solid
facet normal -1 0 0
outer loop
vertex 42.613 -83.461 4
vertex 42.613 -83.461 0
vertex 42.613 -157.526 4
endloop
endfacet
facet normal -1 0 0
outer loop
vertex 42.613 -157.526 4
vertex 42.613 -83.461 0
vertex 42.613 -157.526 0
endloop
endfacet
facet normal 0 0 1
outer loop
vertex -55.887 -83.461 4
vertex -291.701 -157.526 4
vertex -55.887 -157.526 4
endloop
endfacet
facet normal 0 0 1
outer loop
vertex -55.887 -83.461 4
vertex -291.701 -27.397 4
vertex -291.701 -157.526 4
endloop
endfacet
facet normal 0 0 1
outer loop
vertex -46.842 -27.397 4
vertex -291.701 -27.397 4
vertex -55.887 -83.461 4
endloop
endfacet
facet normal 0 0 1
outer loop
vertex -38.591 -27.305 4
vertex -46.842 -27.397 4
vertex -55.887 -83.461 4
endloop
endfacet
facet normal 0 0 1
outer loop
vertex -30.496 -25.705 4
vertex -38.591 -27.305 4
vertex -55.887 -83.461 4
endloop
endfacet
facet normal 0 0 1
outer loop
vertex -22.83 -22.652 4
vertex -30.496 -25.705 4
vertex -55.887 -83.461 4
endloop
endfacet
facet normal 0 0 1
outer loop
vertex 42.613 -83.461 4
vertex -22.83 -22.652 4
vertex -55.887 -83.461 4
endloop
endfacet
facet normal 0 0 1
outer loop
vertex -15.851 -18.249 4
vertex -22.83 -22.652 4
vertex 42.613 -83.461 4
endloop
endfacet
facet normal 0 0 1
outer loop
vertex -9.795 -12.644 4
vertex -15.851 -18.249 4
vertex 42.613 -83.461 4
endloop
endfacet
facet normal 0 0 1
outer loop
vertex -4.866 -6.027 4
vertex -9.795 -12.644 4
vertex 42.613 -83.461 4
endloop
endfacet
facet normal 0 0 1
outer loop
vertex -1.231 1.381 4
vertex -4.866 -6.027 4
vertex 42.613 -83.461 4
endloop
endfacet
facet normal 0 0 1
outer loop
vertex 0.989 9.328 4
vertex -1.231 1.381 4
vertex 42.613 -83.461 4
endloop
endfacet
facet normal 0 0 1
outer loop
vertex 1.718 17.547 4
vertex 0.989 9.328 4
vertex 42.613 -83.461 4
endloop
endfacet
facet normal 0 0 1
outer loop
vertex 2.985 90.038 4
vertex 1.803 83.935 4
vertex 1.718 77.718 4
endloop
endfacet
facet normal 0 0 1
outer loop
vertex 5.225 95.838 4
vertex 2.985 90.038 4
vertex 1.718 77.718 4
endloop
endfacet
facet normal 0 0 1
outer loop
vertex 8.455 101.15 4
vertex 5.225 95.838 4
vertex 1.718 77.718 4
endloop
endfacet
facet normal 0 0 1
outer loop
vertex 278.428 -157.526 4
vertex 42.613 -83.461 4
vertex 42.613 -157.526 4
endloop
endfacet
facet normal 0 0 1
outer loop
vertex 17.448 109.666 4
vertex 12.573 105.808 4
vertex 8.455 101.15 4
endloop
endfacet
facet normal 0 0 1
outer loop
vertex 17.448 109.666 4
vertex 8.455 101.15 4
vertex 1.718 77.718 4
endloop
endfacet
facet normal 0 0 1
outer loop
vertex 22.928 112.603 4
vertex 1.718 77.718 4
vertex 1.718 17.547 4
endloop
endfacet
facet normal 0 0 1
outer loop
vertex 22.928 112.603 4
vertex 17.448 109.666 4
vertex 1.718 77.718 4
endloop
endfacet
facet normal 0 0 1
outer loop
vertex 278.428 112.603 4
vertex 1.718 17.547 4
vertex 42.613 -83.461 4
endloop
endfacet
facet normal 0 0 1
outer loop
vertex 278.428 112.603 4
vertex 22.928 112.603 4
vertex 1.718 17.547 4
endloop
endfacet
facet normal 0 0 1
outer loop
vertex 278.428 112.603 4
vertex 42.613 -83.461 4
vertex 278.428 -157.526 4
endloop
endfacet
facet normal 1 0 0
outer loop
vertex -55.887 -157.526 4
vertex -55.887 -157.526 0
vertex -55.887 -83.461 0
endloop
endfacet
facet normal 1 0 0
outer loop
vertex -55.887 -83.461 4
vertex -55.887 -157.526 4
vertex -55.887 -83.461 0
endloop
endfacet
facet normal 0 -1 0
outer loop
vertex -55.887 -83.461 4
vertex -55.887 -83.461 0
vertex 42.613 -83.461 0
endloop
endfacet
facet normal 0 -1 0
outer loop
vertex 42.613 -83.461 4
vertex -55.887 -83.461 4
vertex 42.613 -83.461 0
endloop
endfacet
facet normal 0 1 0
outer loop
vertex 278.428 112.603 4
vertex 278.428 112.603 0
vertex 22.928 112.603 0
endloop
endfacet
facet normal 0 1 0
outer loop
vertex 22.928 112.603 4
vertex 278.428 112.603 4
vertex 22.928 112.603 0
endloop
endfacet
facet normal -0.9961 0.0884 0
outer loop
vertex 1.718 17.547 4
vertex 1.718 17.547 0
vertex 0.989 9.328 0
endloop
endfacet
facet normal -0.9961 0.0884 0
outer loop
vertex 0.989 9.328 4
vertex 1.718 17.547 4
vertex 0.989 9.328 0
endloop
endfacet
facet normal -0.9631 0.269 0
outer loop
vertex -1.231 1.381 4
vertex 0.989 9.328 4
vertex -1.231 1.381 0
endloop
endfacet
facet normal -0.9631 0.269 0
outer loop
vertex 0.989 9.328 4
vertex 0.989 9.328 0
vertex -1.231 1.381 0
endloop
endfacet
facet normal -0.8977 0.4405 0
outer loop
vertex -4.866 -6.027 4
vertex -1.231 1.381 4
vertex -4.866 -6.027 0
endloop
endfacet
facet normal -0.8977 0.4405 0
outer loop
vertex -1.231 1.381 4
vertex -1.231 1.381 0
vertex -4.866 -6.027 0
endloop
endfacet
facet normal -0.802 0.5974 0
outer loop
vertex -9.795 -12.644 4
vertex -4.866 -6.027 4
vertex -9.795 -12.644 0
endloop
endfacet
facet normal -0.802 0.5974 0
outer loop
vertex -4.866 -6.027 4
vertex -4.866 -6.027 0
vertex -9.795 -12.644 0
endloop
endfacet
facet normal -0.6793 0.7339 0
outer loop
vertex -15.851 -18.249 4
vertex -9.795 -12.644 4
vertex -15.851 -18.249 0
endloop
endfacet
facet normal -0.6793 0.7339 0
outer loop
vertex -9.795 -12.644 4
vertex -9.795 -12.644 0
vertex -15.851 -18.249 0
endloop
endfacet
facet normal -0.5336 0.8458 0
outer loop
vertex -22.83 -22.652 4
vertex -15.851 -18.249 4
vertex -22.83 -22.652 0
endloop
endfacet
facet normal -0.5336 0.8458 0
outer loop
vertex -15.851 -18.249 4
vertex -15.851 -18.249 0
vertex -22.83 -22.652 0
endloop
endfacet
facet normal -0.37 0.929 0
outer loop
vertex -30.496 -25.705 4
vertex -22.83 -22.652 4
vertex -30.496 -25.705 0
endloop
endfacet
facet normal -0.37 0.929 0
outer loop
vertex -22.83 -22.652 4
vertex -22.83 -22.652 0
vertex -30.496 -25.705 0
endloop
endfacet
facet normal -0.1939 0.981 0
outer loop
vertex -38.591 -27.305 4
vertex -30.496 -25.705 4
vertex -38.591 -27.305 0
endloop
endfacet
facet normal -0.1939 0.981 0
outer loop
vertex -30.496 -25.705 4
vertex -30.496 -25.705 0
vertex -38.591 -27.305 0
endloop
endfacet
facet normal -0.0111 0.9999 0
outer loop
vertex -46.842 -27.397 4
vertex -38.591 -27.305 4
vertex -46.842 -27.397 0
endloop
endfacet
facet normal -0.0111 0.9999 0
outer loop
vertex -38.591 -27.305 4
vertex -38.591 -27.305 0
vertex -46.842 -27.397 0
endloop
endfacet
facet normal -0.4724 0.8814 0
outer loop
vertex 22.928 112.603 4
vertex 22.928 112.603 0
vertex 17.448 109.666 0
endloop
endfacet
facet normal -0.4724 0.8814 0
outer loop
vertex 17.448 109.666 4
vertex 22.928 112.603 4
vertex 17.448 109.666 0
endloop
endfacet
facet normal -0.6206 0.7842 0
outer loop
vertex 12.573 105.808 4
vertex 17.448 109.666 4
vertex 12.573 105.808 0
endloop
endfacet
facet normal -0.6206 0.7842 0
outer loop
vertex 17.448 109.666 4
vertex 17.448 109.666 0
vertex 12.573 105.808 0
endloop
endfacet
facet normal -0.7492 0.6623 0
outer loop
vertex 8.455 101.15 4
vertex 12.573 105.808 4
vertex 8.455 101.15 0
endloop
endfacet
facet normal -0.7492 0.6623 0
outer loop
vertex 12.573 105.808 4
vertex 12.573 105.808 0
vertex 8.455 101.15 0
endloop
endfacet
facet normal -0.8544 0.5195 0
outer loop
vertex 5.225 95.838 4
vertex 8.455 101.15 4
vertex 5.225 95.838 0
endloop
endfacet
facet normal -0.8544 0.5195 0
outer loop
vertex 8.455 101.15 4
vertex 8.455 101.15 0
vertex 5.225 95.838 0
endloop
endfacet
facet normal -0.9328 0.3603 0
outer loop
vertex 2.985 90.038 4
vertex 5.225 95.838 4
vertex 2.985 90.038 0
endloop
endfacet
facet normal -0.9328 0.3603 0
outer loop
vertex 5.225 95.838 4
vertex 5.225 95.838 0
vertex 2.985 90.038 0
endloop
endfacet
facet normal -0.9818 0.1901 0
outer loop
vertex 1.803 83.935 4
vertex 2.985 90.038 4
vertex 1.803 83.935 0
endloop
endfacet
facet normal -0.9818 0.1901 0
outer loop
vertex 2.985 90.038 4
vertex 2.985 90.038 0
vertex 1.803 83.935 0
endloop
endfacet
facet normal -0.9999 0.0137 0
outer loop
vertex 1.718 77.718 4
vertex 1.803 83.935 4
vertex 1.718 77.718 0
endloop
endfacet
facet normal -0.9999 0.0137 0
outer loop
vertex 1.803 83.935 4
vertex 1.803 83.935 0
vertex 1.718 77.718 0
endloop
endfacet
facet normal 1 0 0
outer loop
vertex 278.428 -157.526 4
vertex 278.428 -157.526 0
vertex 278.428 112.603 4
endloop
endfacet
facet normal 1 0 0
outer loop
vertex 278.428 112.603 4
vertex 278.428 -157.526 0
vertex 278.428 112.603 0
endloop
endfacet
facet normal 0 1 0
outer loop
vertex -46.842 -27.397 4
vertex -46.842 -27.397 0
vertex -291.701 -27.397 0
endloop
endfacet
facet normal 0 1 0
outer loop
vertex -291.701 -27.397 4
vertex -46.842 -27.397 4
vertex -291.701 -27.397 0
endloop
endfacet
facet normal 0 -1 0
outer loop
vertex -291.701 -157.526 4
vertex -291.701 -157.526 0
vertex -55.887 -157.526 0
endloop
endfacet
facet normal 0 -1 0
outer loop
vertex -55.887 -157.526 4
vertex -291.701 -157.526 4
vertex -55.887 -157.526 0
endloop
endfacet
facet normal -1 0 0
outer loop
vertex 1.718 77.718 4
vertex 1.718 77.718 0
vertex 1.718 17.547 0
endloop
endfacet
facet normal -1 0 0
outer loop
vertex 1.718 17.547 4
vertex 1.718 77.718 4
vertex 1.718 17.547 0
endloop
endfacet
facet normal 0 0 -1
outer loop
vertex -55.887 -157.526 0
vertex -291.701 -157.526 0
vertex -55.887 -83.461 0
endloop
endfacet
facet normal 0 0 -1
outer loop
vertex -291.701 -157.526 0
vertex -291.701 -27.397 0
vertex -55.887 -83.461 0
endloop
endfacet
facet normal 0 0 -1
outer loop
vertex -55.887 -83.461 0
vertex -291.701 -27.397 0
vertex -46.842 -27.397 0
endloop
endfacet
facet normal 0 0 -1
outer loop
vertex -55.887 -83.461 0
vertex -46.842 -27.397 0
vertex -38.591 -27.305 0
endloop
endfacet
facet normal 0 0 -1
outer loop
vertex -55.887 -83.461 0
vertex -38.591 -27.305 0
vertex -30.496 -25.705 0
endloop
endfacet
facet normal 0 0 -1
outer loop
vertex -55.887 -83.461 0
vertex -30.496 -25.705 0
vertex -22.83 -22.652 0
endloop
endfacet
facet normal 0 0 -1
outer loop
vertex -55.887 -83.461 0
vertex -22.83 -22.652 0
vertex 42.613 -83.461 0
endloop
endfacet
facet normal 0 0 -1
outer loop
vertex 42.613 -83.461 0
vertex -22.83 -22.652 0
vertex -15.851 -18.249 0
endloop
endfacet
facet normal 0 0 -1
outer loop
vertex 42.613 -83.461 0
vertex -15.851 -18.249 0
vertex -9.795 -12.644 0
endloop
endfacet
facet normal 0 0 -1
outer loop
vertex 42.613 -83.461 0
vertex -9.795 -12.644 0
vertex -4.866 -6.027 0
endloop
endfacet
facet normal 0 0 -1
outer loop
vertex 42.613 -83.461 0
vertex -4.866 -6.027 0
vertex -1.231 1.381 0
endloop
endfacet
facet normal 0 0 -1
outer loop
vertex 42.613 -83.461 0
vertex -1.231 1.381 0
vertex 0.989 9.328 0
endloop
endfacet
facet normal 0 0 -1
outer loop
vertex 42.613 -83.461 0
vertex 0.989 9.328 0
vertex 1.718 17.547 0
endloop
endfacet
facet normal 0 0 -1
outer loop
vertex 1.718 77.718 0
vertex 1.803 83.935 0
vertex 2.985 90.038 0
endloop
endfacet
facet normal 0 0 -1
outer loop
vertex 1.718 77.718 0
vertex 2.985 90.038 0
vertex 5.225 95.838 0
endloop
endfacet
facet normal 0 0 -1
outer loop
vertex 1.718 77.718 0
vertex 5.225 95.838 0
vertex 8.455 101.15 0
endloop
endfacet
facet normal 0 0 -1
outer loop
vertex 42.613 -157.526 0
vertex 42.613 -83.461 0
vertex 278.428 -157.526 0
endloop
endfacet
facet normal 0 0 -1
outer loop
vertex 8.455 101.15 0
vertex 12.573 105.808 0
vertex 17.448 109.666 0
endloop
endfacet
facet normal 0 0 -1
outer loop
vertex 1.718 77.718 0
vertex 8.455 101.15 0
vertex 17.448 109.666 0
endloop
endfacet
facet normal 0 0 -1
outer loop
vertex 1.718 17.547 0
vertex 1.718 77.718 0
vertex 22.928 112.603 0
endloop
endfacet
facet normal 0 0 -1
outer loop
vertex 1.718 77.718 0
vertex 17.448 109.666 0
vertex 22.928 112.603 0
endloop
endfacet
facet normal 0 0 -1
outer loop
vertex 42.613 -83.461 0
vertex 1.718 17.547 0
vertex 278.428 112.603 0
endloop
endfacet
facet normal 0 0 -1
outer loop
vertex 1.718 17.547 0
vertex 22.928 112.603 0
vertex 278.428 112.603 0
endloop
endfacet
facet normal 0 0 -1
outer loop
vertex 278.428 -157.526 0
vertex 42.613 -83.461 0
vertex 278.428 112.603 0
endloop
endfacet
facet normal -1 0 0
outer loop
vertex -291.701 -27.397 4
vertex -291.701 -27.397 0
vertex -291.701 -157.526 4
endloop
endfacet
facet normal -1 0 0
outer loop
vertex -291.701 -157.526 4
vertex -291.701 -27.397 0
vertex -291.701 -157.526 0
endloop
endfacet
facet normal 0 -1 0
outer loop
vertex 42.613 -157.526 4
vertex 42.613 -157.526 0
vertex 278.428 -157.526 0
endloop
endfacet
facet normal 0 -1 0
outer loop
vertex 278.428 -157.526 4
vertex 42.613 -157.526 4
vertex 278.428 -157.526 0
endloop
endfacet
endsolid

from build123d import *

# Parameters (mm, degrees)
F0_W     = 1
F0_H     = 6
F0_W_2   = 96.5
F1_DEPTH = 4


with BuildPart() as f1:
    # F0 (on Top) → F1 (new body)
    with BuildSketch(Plane.XY):
        with BuildLine():
            Line((-291.7007803917, -157.5256759562), (-55.8865144849, -157.5256759562))
            Line((-55.8865144849, -157.5256759562), (-55.8865144849, -83.4614100494))
            Line((-55.8865144849, -83.4614100494), (-55.8865144849, -77.4614100494))
            Line((-55.8865144849, -77.4614100494), (-54.8865144849, -77.4614100494))
            Line((-54.8865144849, -77.4614100494), (41.6134855151, -77.4614100494))
            Line((41.6134855151, -77.4614100494), (42.6134855151, -77.4614100494))
            Line((42.6134855151, -77.4614100494), (42.6134855151, -83.4614100494))
            Line((42.6134855151, -83.4614100494), (42.6134855151, -157.5256759562))
            Line((42.6134855151, -157.5256759562), (278.4277514219, -157.5256759562))
            Line((278.4277514219, -157.5256759562), (278.4277514219, 112.6028558574))
            Line((278.4277514219, 112.6028558574), (22.9277393461, 112.6028558574))
            ThreePointArc((22.9277393461, 112.6028558574), (6.7223803738, 98.5655061138), (1.7183407144, 77.7179538753))
            Line((1.7183407144, 77.7179538753), (1.7183407144, 17.5473609517))
            ThreePointArc((1.7183407144, 17.5473609517), (-12.6941933844, -15.5861694622), (-46.841709457, -27.3971441426))
            Line((-46.841709457, -27.3971441426), (-291.7007803917, -27.3971441426))
            Line((-291.7007803917, -27.3971441426), (-291.7007803917, -157.5256759562))
        make_face()
        with Locations((-55.3865144849, -80.4614100494)):
            Rectangle(F0_W, F0_H)
        with Locations((42.1134855151, -80.4614100494)):
            Rectangle(F0_W, F0_H)
        with Locations((-6.6365144849, -80.4614100494)):
            Rectangle(F0_W_2, F0_H)
    extrude(amount=F1_DEPTH)


solid = f1.part
